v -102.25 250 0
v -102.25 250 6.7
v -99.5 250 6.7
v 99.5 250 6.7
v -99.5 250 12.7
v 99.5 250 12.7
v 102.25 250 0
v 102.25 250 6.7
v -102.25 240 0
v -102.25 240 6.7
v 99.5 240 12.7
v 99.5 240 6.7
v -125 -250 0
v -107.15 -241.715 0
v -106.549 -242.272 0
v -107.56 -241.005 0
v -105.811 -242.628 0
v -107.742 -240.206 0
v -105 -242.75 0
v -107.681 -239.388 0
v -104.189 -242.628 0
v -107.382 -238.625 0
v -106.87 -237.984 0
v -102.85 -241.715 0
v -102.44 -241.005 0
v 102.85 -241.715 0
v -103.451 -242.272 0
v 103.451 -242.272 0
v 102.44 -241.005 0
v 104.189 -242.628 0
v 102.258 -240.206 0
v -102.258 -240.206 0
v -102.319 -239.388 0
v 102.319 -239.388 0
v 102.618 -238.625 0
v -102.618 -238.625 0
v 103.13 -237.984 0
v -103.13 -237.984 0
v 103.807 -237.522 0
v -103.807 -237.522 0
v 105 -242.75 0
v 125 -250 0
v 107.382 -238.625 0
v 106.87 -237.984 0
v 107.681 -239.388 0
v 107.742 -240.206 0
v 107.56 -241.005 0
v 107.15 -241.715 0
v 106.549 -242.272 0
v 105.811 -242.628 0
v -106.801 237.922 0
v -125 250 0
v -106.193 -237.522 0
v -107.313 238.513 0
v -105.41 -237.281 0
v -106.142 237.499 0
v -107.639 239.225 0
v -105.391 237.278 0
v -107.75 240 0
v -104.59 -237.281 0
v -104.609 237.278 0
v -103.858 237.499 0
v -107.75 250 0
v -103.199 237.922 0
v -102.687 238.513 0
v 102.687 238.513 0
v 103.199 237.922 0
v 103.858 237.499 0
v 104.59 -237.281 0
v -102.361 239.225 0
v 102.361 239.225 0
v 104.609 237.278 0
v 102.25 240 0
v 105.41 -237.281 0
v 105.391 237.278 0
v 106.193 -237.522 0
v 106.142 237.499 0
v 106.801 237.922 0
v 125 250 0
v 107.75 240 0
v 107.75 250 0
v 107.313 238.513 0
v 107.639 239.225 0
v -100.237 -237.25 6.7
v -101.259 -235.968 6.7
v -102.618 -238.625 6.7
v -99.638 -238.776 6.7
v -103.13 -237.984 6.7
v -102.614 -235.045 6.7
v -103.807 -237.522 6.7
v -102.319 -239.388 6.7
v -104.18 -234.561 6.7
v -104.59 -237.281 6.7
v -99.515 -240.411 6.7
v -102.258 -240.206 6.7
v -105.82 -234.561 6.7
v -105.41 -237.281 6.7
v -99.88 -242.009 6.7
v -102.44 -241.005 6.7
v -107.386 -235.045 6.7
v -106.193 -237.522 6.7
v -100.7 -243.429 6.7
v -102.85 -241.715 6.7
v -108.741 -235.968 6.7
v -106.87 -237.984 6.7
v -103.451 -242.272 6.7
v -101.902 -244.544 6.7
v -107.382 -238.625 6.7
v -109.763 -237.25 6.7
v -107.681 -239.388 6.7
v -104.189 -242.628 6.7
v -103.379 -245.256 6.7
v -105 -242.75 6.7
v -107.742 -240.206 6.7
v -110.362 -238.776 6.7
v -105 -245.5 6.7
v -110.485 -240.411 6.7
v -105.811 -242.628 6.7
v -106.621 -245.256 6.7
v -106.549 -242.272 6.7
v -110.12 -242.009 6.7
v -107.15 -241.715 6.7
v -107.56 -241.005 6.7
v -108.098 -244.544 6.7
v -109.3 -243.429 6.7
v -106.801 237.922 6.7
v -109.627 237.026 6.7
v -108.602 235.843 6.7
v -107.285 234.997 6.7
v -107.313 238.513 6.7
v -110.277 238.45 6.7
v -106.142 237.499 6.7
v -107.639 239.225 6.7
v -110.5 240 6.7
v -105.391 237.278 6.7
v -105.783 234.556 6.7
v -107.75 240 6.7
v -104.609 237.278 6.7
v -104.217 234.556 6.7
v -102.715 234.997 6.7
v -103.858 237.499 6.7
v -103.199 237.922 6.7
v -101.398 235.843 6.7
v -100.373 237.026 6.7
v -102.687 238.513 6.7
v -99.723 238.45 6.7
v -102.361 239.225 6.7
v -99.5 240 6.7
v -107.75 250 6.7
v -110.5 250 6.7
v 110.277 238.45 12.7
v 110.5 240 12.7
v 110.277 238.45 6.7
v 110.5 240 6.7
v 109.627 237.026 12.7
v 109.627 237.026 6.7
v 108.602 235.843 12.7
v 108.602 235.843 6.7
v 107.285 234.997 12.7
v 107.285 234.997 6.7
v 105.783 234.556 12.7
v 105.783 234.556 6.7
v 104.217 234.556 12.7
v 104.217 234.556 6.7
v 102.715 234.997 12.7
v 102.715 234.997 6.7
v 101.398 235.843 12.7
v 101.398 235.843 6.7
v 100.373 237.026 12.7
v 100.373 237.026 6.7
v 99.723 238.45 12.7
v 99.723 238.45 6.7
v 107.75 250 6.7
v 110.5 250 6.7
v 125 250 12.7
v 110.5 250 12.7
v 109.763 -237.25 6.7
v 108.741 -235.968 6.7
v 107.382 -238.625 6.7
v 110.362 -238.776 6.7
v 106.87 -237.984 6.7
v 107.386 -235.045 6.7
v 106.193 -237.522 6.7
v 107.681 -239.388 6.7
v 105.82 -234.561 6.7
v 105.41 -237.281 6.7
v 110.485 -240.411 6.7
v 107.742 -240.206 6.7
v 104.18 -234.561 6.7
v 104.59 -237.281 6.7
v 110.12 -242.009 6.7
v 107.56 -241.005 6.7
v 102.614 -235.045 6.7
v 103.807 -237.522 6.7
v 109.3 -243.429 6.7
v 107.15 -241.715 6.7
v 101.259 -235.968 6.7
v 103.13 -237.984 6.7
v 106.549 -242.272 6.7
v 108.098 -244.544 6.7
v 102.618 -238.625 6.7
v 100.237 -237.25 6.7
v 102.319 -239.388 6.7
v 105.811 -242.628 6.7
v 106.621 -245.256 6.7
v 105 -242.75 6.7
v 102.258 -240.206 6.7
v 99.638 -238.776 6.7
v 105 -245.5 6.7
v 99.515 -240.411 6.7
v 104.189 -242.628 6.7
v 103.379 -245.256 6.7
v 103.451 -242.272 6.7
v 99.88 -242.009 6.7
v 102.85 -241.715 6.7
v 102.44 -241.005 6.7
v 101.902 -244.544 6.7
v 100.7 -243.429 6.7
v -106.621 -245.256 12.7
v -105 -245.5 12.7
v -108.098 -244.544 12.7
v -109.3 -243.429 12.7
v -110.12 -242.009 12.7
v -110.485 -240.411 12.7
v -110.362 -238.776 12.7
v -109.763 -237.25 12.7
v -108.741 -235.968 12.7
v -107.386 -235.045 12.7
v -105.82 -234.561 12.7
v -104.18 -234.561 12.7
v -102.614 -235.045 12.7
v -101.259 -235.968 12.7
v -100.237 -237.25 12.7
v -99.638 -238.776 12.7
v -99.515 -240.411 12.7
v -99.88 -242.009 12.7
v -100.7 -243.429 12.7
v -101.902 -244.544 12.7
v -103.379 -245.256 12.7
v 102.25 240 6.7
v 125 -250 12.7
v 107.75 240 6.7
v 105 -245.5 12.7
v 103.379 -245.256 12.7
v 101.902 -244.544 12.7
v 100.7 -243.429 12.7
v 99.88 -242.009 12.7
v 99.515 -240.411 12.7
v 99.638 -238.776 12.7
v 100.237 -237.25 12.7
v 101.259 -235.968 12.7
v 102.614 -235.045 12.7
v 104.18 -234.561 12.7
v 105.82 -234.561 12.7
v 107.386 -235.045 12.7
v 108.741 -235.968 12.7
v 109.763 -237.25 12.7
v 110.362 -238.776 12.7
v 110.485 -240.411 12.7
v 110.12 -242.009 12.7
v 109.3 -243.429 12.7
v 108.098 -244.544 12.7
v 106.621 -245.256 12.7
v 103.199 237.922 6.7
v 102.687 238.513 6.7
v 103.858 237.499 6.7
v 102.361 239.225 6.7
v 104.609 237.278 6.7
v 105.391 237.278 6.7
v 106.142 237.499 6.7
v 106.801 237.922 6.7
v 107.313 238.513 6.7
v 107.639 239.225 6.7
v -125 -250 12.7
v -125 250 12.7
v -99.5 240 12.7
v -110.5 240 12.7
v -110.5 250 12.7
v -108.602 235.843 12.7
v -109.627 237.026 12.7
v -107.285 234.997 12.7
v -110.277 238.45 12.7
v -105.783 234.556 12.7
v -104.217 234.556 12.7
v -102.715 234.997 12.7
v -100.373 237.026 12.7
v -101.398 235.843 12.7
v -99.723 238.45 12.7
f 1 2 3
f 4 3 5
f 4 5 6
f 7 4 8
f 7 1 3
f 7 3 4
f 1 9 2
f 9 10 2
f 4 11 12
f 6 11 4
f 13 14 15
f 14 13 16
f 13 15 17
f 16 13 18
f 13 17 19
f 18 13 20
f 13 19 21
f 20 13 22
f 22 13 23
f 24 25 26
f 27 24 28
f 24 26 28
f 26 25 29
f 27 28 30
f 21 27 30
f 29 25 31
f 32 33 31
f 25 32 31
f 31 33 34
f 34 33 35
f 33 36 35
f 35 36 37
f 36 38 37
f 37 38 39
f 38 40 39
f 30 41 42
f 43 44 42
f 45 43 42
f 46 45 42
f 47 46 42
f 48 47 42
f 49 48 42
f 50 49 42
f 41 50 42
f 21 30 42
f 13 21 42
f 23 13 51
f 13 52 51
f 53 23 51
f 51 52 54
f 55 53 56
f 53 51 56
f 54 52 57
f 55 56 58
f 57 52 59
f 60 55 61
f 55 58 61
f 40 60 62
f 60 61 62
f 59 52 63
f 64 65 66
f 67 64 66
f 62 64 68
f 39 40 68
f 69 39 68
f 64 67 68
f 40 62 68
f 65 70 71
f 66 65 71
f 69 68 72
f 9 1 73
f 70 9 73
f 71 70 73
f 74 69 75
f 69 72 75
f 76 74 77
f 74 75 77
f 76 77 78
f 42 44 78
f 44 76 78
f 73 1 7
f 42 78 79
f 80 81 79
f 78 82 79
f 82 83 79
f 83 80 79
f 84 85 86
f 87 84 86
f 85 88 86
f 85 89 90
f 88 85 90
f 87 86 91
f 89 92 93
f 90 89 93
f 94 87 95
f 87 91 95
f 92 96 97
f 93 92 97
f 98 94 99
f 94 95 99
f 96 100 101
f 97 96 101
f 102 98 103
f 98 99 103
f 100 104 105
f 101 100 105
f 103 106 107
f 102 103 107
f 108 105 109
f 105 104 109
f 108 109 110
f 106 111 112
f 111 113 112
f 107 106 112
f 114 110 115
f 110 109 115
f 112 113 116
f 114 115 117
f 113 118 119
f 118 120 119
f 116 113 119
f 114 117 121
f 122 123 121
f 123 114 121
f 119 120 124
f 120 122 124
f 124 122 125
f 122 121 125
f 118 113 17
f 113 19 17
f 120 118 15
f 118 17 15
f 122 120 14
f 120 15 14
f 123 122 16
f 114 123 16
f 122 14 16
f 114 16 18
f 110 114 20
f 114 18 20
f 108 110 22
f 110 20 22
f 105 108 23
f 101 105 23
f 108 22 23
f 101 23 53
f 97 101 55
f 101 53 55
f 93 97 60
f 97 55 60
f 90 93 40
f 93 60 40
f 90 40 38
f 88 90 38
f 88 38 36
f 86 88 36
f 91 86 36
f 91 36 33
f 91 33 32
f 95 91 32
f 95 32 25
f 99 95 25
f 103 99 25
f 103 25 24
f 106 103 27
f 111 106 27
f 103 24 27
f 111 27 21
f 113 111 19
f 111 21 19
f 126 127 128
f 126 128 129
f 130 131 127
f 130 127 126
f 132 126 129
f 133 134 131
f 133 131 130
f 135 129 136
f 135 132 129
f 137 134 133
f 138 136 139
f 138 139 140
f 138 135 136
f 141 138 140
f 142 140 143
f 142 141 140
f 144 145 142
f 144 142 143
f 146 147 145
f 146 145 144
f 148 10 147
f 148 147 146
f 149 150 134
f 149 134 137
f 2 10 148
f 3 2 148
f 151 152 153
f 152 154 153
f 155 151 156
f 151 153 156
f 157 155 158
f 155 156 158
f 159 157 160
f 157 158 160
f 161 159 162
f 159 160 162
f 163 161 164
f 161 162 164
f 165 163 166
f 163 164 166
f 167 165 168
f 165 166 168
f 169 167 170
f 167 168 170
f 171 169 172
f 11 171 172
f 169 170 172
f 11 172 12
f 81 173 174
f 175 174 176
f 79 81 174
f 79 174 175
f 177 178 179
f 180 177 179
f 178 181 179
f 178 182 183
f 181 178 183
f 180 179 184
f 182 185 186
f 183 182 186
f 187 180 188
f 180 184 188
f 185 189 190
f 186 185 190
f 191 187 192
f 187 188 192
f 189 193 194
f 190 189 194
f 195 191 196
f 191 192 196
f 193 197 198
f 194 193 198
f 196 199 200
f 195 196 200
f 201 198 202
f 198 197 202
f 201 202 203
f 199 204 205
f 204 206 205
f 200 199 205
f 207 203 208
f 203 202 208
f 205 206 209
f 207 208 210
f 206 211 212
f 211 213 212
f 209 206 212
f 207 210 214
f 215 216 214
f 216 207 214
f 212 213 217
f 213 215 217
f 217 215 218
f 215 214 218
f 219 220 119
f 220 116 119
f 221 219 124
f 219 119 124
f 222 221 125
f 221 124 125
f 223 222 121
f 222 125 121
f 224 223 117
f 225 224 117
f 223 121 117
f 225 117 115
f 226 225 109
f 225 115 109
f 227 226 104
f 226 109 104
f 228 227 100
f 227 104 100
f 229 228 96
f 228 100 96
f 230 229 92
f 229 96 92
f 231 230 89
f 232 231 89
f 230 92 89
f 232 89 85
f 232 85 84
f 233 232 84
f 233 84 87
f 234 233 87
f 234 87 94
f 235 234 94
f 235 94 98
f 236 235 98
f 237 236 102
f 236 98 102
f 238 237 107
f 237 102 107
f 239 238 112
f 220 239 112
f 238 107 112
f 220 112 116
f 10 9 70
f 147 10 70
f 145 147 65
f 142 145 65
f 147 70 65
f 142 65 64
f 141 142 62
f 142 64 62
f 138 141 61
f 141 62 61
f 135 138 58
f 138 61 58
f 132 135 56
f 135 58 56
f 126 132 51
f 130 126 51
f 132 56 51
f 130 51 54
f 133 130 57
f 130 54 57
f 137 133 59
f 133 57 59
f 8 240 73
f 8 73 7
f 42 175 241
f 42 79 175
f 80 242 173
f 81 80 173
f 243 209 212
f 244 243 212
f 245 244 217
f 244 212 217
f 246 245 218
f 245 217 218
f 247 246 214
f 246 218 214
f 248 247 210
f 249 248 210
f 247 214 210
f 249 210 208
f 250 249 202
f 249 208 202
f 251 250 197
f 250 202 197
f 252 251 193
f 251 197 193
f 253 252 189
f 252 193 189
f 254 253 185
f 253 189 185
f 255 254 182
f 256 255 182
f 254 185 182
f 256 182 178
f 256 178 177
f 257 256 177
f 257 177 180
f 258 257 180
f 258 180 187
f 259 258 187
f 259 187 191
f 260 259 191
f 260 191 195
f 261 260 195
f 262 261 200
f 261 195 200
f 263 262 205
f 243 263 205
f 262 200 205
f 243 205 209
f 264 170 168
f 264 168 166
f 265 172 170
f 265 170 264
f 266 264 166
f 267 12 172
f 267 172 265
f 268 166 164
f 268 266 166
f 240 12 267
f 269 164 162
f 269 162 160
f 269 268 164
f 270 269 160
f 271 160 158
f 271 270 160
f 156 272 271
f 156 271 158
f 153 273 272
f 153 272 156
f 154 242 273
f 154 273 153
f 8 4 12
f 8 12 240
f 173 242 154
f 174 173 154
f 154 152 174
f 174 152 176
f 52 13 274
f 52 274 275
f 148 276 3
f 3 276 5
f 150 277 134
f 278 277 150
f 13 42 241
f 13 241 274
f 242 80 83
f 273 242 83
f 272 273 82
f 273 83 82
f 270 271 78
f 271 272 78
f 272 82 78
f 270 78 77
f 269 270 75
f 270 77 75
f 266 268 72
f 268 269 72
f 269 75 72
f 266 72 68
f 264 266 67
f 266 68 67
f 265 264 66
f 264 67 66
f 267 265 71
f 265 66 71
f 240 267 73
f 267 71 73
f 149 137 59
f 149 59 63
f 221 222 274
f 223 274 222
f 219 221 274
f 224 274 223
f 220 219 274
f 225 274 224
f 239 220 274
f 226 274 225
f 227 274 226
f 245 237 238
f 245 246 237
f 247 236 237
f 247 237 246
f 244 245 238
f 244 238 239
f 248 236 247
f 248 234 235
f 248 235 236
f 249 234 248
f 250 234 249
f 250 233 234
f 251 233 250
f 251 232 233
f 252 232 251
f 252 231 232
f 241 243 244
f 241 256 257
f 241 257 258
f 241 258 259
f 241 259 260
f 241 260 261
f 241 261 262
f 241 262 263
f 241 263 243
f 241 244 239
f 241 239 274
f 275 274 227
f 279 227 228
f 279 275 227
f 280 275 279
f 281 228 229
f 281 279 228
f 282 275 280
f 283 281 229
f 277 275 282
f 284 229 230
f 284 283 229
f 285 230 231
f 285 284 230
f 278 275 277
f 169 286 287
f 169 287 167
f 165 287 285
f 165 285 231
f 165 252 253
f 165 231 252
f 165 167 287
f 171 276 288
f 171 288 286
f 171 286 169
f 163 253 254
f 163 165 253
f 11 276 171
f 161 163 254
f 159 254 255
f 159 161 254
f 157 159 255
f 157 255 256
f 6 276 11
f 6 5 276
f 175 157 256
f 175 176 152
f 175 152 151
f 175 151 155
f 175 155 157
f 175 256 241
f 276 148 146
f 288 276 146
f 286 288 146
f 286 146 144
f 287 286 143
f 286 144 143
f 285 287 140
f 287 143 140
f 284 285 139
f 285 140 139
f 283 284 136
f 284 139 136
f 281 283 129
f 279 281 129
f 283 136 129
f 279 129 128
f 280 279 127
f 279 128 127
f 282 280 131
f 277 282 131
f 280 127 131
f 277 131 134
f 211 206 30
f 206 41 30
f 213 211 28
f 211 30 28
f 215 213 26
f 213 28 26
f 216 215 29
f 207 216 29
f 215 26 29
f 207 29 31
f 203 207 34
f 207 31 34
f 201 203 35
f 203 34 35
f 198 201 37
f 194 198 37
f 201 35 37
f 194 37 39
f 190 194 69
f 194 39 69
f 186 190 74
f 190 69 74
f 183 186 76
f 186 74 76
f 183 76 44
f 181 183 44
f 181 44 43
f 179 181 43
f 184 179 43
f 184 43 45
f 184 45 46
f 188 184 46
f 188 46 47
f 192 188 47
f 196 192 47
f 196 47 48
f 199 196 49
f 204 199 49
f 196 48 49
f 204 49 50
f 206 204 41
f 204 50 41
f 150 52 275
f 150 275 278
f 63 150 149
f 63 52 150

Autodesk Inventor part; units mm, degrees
ref_plane "YZ Plane" through (0, 0, 0) normal (1, 0, 0) x (0, 1, 0)
ref_plane "XZ Plane" through (0, 0, 0) normal (0, 1, 0) x (-1, 0, 0)
ref_plane "XY Plane" through (0, 0, 0) normal (0, 0, 1) x (1, 0, 0)
sketch "Sketch1" plane through (0, 0, 0) normal (0, 0, 1) x (1, 0, 0)
  line L0 (-125, 250) -> (125, 250)
  line L1 (125, 250) -> (125, -250)
  line L2 (125, -250) -> (-125, -250)
  line L3 (-125, -250) -> (-125, 250)
  point P0 (0, 0)
  dimension "d0" = 250
  dimension "d1" = 500
  dimension "d2" = 125
  dimension "d3" = 250
extrude "Extrusion1" add sketch "Sketch1" along normal blind 12.7
sketch "Sketch2" plane through (0, 0, 12.7) normal (0, 0, 1) x (1, 0, 0)
  line L0 (-125, -250) -> (125, -250) projected
  line L1 (125, -250) -> (125, 250) projected
  circle A0 centre (105, -240) radius 2.75
  point P0 (0, 0)
  dimension "d6" = 5.5
  dimension "d7" = 10
  dimension "d8" = 20
hole "Hole1" at (105, -240, 12.7) direction (0, 0, -1) diameter 5.5 end through all counterbore diameter 11 counterbore depth 6
pattern_linear "Rectangular Pattern1" count 2 spacing 210 along (-1, 0, 0) count 2 spacing 480 along (0, 1, 0) of "Hole1"
sketch "Sketch4" plane through (0, 0, 12.7) normal (0, 0, 1) x (1, 0, 0)
  circle A0 centre (-105, 240) radius 5.5 projected
  circle A1 centre (105, 240) radius 5.5 projected
  line L0 (125, 250) -> (-125, 250) projected
  line L1 (-110.5, 240) -> (-110.5, 250)
  line L2 (-99.5, 240) -> (-99.5, 250)
  line L3 (99.5, 240) -> (99.5, 250)
  line L4 (110.5, 240) -> (110.5, 250)
  point P0 (0, 0)
extrude "Extrusion2" cut sketch "Sketch4" against normal blind 6 contours L0 L4 A1 L3 | A0 L1 L0 L2
sketch "Sketch5" plane through (-105, 240, 6.7) normal (0, 0, 1) x (1, 0, 0)
  line L0 (-5.5, 10) -> (5.5, 10) projected
  circle A0 centre (0, 0) radius 2.75 projected
  arc A1 (204.5, 0) -> (215.5, 0) centre (210, 0) ccw projected
  line L1 (215.5, 10) -> (215.5, 0) projected
  line L2 (204.5, 10) -> (215.5, 10) projected
  line L3 (204.5, 0) -> (204.5, 10) projected
  circle A2 centre (210, 0) radius 2.75 projected
  line L4 (-2.75, 0) -> (-2.75, 10)
  line L5 (2.75, 0) -> (2.75, 10)
  line L6 (212.75, 0) -> (212.75, 10)
  line L7 (207.25, 0) -> (207.25, 10)
  point P0 (105, -240)
extrude "Extrusion3" cut sketch "Sketch5" against normal through all contours L0 L5 A0 L4 | L2 L6 A2 L7
equation "\"d2\" = 0.5 * d0"
equation "\"d3\" = 0.5 * d1"
properties part number "PS20001" material "MDF Medium Density Fiberboard"
